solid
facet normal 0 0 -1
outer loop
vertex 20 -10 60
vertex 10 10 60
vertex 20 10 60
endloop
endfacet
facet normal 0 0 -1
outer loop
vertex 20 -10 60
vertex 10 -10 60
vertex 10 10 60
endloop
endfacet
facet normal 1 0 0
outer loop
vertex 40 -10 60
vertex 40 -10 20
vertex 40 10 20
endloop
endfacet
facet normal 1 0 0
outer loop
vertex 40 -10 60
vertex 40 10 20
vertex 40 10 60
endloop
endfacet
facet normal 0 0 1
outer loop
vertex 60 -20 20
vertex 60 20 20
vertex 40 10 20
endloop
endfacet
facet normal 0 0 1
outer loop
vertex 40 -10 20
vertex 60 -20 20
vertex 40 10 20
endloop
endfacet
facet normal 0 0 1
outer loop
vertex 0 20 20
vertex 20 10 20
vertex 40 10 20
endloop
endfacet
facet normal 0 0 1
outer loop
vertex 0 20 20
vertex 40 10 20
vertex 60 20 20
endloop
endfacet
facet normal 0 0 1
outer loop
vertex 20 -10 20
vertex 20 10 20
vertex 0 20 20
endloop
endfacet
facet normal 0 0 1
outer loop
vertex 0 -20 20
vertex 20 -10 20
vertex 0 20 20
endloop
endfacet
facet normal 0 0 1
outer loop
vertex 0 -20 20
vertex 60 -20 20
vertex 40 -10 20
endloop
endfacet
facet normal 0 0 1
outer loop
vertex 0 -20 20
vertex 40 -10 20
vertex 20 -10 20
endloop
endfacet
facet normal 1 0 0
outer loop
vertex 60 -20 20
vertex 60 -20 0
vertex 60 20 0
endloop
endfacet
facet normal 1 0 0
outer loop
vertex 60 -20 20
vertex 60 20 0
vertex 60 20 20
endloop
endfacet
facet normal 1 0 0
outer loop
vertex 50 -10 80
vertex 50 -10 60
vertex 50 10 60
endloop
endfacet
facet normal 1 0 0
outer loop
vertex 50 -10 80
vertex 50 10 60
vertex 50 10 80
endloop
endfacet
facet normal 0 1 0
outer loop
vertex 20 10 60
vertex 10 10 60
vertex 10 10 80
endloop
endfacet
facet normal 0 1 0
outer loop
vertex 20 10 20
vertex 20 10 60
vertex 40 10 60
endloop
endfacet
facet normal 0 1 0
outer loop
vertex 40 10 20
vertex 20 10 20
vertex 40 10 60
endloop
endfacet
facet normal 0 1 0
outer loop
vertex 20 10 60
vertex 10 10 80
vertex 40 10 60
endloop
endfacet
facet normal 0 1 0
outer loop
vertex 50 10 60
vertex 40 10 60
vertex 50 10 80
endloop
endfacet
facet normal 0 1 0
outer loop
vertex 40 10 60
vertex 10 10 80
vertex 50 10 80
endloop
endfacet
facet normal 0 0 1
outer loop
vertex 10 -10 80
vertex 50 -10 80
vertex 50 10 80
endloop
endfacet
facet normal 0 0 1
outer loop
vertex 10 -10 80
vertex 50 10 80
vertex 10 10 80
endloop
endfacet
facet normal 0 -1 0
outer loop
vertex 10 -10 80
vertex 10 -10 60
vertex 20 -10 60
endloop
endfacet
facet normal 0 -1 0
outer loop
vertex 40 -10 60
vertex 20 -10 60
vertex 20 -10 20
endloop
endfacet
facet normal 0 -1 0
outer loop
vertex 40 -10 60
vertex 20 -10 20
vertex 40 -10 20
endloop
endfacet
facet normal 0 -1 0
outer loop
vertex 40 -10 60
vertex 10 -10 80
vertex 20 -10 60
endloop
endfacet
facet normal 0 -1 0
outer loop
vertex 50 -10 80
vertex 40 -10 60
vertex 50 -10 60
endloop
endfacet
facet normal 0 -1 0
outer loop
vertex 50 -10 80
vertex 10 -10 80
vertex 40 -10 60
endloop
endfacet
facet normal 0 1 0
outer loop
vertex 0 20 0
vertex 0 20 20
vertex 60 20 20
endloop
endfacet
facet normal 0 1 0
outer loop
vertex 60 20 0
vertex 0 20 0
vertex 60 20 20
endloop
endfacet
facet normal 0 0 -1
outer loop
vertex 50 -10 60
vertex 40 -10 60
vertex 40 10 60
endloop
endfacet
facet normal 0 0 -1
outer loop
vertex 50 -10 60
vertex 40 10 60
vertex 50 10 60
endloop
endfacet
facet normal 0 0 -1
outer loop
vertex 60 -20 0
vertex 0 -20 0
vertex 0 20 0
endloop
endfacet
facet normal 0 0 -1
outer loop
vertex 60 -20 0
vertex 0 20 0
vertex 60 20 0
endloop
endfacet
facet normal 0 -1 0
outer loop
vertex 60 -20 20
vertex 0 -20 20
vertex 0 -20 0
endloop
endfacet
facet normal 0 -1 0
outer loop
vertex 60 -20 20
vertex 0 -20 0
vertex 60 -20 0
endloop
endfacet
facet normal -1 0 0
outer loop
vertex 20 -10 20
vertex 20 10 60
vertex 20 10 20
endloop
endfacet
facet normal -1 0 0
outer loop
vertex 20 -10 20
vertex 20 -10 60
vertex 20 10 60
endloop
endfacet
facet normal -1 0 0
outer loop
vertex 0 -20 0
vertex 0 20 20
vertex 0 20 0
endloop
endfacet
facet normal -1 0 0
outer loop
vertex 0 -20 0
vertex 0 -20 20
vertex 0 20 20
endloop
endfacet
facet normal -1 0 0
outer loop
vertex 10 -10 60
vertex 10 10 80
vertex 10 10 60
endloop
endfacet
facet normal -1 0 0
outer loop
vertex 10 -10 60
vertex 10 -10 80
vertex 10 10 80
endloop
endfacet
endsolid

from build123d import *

# Parameters (mm, degrees)
F1_DEPTH = 20
F2_DEPTH = 10


with BuildPart() as f1:
    # F0 (on Front) → F1 (new body, symmetric)
    with BuildSketch(Plane.XZ):
        Polygon((0, 20), (0, 0), (60, 0), (60, 20), (40, 20), (20, 20), align=None)
    extrude(amount=F1_DEPTH, both=True)

    # F0 (on Front) → F2 (join, symmetric)
    with BuildSketch(Plane.XZ):
        Polygon((20, 60), (20, 20), (40, 20), (40, 60), (50, 60), (50, 80), (10, 80), (10, 60), align=None)
    extrude(amount=F2_DEPTH, both=True)


solid = f1.part
